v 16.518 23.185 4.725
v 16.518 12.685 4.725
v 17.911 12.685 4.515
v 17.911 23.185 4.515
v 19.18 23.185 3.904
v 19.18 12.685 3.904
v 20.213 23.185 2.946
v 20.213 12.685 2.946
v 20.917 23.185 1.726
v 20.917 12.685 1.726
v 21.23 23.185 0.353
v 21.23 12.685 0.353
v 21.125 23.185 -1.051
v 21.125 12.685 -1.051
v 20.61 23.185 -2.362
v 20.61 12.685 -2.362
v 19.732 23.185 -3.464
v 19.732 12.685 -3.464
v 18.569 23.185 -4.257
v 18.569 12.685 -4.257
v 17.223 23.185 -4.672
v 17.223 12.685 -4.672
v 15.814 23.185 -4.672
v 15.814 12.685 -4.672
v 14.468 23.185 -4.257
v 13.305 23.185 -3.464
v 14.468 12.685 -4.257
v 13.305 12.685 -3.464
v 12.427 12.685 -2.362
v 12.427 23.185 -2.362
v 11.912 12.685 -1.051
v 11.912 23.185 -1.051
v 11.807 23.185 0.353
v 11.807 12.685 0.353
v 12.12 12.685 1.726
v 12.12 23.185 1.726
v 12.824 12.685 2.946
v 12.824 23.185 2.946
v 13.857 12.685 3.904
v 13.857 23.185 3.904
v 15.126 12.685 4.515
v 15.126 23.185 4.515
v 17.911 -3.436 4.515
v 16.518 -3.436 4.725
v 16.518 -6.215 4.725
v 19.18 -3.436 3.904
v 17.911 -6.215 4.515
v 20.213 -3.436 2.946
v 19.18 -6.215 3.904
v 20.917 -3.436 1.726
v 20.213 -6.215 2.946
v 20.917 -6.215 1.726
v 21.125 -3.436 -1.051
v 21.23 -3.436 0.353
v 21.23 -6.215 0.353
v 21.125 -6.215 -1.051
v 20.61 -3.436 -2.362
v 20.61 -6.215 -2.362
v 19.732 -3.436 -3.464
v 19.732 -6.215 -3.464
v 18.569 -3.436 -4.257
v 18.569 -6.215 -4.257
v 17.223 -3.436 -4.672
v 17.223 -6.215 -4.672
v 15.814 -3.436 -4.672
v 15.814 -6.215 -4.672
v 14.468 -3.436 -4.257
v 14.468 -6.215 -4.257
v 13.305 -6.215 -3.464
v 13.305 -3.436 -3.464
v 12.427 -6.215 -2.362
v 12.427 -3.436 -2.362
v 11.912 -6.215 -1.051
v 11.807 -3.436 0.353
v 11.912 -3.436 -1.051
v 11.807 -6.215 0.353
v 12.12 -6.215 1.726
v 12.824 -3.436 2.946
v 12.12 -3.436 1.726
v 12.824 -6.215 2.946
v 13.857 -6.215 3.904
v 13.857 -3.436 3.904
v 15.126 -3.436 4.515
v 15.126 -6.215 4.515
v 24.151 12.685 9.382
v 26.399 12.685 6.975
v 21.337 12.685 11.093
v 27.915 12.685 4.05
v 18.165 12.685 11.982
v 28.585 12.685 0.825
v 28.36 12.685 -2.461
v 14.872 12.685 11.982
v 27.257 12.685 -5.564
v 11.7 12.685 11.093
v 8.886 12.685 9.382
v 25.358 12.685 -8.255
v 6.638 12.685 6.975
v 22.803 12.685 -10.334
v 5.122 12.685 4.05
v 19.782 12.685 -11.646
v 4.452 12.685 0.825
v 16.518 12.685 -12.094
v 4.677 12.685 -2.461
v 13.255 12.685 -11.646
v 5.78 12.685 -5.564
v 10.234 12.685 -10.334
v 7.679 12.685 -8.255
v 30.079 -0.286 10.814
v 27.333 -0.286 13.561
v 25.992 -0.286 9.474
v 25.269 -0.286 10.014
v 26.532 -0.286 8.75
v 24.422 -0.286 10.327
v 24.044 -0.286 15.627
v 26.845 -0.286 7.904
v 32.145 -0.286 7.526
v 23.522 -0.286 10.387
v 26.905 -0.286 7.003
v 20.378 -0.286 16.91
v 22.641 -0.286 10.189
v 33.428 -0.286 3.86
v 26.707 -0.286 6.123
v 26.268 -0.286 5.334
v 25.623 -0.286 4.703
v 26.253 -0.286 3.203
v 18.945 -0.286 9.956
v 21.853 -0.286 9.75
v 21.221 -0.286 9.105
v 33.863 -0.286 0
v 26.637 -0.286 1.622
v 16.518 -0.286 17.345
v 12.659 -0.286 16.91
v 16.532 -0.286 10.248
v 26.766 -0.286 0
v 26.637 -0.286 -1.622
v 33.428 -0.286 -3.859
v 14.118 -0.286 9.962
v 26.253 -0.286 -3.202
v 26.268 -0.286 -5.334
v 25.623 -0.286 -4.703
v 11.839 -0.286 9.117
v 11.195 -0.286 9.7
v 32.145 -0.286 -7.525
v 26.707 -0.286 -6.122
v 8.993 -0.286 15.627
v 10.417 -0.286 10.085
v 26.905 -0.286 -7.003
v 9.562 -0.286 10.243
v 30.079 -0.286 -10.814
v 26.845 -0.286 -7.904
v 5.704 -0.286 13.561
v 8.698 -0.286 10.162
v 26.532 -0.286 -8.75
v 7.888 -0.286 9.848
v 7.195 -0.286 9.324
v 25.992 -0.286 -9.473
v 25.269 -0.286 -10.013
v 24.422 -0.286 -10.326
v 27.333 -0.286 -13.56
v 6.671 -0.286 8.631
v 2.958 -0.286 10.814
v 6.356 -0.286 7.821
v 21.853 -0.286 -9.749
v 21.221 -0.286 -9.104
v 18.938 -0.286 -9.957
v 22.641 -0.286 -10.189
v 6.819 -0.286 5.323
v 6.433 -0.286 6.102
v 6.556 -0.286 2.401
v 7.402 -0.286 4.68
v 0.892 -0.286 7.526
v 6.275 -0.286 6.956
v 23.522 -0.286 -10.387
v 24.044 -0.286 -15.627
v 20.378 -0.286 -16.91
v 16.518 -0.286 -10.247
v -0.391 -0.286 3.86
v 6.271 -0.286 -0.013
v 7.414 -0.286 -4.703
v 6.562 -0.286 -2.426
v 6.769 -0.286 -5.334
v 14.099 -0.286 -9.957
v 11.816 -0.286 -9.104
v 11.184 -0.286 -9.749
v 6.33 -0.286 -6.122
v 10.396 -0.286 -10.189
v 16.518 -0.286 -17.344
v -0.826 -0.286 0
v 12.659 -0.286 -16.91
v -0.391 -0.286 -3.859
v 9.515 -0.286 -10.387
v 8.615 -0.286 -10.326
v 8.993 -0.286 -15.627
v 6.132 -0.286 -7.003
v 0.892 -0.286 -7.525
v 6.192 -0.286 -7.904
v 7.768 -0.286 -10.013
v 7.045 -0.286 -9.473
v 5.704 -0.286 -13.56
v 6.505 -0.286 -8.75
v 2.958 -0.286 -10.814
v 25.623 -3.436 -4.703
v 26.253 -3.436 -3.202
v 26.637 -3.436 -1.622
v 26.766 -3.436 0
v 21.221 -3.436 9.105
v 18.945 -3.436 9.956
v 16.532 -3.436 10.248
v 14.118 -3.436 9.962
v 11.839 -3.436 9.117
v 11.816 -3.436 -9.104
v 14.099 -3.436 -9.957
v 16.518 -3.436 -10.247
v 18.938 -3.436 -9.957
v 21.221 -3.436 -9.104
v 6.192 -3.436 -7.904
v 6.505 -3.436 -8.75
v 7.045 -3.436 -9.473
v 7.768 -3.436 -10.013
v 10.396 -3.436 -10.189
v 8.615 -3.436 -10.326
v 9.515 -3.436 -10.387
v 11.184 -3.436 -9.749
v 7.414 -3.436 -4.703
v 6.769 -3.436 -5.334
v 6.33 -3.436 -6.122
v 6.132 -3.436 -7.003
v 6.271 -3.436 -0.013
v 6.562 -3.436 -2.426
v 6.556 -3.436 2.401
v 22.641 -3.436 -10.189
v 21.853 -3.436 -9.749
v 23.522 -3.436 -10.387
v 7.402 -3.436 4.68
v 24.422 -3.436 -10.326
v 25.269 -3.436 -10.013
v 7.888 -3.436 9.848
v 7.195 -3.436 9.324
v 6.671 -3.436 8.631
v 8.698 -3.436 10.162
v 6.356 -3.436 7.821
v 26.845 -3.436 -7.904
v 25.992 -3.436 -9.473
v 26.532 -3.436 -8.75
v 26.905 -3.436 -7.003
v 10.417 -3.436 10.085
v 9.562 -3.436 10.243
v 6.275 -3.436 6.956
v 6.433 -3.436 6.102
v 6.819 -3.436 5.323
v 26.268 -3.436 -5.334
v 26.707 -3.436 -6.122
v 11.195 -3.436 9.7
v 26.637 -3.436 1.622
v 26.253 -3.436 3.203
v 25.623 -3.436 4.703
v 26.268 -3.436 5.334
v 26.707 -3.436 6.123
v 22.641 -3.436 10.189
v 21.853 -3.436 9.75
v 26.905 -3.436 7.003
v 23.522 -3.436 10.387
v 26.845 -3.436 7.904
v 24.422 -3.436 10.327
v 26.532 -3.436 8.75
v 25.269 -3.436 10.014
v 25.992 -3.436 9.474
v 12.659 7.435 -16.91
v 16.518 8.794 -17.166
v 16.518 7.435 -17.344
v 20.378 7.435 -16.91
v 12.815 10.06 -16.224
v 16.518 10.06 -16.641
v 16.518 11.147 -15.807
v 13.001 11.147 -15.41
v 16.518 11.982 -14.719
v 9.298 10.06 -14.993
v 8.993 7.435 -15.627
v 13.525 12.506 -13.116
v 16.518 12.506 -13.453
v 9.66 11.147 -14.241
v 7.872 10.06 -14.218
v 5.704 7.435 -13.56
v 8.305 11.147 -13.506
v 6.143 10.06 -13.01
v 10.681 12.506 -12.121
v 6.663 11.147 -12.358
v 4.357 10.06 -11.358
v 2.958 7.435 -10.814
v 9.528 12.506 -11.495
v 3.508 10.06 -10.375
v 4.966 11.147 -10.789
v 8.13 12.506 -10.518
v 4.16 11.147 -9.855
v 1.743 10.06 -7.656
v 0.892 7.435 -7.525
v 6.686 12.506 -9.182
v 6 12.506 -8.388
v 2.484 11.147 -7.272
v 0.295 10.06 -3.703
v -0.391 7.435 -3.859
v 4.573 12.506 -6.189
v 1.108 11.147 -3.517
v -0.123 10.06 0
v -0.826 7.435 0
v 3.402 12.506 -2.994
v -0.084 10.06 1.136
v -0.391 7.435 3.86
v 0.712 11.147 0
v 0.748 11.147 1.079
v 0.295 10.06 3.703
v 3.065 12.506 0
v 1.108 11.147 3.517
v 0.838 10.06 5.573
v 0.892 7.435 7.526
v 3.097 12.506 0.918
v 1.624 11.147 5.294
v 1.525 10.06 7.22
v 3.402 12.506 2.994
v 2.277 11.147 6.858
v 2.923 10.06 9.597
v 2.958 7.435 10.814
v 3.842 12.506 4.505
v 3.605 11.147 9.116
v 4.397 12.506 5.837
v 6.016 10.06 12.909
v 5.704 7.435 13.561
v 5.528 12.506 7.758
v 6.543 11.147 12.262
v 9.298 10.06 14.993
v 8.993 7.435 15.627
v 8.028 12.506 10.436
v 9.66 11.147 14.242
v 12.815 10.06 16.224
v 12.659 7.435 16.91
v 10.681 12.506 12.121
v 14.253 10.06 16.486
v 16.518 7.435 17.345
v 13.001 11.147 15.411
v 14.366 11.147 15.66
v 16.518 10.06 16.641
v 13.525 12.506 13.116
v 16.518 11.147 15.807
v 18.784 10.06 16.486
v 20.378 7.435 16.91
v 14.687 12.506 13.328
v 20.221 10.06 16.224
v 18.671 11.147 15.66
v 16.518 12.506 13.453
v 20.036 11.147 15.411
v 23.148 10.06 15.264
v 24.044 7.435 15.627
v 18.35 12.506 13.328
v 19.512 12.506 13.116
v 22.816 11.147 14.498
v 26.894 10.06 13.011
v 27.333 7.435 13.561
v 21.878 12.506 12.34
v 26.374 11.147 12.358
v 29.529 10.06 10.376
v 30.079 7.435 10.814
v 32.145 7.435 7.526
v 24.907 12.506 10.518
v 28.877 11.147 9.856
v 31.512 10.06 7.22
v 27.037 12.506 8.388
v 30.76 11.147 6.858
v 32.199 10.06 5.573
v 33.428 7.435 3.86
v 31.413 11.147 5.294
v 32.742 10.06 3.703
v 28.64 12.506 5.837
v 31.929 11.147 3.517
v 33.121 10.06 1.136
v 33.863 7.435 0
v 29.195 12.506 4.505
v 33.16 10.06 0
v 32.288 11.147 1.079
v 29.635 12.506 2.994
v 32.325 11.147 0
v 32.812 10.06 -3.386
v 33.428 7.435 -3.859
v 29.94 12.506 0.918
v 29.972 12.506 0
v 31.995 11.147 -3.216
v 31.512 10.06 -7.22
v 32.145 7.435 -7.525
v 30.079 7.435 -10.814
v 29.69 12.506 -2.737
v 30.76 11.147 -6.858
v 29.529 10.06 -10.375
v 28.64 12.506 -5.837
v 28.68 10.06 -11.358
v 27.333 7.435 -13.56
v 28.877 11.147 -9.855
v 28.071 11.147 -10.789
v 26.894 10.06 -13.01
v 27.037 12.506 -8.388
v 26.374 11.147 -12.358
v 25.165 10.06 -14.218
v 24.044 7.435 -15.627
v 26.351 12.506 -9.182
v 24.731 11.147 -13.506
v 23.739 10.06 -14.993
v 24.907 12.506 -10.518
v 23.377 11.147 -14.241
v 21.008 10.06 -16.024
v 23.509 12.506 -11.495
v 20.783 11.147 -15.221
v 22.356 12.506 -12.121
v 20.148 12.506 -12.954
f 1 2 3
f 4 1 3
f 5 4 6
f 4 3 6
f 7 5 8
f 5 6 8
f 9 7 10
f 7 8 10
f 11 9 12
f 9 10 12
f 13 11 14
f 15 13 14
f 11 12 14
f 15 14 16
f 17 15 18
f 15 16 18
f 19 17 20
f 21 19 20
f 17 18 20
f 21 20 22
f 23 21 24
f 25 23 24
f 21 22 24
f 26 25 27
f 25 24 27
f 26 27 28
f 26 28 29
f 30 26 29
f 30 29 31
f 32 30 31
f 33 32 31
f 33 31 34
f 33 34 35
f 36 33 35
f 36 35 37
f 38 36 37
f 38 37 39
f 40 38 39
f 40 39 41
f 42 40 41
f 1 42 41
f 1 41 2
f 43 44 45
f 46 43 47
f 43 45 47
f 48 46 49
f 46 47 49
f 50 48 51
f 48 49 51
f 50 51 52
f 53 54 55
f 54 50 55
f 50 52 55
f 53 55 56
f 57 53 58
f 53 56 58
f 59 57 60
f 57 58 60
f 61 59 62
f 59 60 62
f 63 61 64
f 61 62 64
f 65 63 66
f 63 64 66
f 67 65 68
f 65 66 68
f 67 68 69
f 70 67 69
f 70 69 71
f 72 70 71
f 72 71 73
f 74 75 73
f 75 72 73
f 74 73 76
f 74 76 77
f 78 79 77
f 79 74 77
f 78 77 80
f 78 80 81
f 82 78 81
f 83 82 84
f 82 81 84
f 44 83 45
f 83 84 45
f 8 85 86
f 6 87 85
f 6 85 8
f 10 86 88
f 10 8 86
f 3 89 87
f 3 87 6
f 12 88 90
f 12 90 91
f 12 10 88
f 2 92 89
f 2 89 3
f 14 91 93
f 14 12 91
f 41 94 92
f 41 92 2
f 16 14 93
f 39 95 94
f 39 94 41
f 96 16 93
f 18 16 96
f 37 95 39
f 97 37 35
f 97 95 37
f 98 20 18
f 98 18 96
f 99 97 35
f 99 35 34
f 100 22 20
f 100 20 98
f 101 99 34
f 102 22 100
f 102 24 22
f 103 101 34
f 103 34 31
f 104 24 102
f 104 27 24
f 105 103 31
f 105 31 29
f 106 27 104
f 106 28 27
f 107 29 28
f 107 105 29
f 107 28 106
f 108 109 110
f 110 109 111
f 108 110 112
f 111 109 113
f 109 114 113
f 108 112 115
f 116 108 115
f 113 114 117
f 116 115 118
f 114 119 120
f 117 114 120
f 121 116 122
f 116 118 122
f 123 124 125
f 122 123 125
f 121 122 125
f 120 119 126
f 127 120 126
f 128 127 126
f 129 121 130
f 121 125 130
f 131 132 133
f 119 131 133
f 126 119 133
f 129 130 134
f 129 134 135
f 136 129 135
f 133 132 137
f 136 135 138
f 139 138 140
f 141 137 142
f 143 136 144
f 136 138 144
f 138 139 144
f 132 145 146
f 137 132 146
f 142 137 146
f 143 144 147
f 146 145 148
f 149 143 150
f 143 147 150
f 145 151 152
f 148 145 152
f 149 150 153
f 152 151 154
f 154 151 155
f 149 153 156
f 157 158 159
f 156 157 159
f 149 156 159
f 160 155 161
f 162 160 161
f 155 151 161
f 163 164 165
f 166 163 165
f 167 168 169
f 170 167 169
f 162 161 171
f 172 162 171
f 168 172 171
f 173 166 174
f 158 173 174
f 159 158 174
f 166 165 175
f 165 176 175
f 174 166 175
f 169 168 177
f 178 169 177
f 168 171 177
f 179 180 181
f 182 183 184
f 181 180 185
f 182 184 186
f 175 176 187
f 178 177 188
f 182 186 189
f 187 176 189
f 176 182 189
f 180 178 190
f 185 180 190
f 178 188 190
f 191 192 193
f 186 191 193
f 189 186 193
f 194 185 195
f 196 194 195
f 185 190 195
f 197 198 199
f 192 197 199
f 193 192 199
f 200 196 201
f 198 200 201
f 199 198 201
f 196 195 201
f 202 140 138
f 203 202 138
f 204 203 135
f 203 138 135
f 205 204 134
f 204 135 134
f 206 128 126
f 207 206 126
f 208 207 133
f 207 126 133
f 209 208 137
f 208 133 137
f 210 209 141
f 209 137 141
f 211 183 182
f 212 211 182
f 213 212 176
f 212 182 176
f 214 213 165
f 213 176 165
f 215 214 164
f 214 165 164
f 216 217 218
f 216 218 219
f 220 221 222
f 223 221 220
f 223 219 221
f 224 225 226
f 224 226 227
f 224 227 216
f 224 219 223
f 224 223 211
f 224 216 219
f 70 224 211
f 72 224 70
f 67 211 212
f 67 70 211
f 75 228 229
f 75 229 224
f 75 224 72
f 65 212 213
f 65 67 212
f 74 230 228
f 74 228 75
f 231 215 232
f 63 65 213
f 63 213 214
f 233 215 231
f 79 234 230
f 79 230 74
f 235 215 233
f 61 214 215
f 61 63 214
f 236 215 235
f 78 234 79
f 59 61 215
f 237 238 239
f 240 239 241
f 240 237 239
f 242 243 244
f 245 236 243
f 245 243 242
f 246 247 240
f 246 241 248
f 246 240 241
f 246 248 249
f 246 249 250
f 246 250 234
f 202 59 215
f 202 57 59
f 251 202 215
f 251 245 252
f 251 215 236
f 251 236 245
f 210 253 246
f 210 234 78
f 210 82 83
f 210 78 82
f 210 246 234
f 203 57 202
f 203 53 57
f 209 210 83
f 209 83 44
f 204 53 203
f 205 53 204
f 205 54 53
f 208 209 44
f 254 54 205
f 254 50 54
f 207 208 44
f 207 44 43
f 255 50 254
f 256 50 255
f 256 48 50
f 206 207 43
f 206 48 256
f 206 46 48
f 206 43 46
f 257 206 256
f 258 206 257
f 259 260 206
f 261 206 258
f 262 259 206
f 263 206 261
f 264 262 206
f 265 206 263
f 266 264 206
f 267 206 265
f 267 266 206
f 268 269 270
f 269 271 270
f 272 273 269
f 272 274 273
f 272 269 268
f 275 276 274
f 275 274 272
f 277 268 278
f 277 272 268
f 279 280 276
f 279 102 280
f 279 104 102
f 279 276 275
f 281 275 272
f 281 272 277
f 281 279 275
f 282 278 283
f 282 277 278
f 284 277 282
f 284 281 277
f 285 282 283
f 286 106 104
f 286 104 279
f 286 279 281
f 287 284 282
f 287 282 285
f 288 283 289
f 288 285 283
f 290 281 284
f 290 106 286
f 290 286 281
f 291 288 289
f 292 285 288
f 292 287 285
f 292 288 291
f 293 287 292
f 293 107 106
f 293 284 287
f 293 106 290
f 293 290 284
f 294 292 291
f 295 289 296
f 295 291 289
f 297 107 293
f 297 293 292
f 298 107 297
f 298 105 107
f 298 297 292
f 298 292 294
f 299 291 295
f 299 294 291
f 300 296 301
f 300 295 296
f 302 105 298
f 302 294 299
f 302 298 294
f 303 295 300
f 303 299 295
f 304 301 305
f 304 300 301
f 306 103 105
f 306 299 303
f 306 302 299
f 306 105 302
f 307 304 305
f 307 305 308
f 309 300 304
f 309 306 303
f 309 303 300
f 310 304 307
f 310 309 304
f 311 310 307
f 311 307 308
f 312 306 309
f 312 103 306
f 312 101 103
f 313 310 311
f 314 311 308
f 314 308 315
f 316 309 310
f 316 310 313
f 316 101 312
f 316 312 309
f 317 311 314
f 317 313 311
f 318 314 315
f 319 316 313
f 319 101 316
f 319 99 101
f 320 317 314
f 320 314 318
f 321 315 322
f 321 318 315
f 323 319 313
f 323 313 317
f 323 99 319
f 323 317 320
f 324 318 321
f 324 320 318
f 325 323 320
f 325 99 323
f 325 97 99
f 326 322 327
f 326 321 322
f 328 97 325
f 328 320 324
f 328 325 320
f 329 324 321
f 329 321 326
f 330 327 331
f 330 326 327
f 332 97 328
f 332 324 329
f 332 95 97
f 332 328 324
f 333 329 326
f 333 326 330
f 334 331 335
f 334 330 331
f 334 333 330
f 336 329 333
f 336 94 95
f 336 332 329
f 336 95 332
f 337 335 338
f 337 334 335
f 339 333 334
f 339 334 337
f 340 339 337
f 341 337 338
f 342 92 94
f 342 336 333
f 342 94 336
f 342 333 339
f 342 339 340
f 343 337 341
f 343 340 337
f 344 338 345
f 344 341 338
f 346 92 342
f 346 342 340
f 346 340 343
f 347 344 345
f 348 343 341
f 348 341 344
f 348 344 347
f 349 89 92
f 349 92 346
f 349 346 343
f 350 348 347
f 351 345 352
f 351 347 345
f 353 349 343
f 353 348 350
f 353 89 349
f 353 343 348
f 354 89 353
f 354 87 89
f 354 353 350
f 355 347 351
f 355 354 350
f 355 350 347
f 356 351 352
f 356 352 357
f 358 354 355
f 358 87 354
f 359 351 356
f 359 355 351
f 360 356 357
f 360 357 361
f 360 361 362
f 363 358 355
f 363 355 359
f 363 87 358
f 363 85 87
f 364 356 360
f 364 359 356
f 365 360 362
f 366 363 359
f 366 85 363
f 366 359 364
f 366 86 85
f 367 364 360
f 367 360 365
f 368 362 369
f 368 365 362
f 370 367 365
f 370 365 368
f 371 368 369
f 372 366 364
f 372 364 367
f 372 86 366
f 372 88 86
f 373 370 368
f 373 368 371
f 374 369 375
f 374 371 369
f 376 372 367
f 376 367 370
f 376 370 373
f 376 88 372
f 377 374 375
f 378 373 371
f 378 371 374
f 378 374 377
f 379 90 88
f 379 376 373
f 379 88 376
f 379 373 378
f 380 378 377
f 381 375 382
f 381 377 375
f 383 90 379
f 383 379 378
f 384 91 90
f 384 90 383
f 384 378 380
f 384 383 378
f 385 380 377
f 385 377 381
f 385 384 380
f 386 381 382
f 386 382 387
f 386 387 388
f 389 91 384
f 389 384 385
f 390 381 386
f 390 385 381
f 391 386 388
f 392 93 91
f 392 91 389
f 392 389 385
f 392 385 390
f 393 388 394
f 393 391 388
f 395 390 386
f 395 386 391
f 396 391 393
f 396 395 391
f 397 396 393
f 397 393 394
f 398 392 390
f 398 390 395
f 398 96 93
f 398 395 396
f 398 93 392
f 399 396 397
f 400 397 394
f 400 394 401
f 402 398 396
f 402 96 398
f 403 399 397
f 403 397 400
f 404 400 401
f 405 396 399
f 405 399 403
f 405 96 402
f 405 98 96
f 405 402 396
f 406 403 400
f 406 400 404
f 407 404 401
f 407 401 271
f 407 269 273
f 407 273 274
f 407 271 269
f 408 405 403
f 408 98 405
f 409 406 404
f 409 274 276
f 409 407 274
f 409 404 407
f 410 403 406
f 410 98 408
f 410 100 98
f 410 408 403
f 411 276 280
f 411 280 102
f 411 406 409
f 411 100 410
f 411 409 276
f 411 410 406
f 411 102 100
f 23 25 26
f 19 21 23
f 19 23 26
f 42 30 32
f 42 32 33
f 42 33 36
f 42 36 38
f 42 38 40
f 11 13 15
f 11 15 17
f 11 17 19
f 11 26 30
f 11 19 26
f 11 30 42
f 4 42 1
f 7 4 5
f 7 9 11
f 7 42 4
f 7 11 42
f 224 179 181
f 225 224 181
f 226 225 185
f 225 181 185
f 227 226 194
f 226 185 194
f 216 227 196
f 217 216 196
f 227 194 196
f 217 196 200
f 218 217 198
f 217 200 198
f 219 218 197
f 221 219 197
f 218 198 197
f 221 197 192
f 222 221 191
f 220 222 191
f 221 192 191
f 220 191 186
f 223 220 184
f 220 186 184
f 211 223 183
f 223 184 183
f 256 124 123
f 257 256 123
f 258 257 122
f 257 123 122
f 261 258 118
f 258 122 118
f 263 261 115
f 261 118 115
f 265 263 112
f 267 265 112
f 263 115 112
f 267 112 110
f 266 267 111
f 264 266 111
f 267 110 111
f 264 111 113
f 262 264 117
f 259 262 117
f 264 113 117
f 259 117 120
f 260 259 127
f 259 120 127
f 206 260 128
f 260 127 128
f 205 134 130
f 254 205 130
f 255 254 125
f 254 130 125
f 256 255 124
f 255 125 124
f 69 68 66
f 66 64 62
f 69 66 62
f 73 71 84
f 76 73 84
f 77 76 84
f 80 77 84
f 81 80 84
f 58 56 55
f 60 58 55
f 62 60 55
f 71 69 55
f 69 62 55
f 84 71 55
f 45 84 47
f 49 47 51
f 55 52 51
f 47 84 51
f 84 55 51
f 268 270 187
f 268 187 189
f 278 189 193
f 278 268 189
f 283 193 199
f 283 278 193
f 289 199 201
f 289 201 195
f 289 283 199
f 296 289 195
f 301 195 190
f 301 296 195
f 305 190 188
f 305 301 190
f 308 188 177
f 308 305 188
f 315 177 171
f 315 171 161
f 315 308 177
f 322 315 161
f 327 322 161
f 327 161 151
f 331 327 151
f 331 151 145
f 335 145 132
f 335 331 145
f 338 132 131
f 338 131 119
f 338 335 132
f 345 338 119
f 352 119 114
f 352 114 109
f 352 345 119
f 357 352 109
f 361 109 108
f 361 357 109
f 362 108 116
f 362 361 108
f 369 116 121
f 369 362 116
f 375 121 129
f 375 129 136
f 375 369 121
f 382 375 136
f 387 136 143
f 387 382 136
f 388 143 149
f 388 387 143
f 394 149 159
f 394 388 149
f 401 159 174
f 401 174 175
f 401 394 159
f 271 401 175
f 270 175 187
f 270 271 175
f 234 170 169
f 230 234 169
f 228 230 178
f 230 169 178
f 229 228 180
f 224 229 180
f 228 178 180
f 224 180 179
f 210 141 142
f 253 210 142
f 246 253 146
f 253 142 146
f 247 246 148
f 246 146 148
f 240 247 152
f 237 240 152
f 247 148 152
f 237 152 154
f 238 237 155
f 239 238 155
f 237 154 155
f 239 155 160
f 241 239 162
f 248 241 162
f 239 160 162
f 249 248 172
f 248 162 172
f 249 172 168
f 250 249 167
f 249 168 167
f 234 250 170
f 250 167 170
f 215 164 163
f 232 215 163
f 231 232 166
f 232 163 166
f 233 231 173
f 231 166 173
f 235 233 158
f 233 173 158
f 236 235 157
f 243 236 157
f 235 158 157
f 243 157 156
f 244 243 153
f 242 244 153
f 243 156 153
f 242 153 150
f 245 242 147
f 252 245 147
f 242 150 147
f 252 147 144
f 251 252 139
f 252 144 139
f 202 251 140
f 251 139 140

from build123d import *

# Parameters (mm, degrees)
SKETCH1_W                = 16.518614554
SKETCH1_H                = 12.353050884
BOSS_EXTRUDE1_DEPTH      = 10
BOSS_EXTRUDE1_DEPTH_BACK = 18
SKETCH3_R                = 4.5
FILLET1_R                = 5
SKETCH4_R                = 9.759449404
SKETCH4_R_2              = 3
BOSS_EXTRUDE2_DEPTH      = 3
SCALE2_SCALE             = 1.5
SCALE3_SCALE             = 0.7


with BuildPart() as part:
    # Sketch1 → Revolve1 (revolve)
    with BuildSketch(Plane.XY, mode=Mode.PRIVATE) as revolve1_sk:
        with Locations((8.259307277, 6.176525442)):
            Rectangle(SKETCH1_W, SKETCH1_H)
    revolve(revolve1_sk.sketch.rotate(Axis((16.518614554, 0, 0), (0, 1, 0)), 270), axis=Axis((16.518614554, 0, 0), (0, 1, 0)))

    # Sketch3 → Boss-Extrude1 (add, two sides: drawn at the far end of the back side and taken through both)
    with BuildSketch(Plane(origin=(0, 12.353050884, 0), x_dir=(1, 0, 0), z_dir=(0, 1, 0)).offset(-BOSS_EXTRUDE1_DEPTH_BACK)):
        with Locations(Location((16.518614554, 0, 0), (0, 0, 270))):
            Circle(SKETCH3_R)
    extrude(amount=BOSS_EXTRUDE1_DEPTH + BOSS_EXTRUDE1_DEPTH_BACK)

    # Fillet1
    fillet1_edges = [part.edges().sort_by_distance(p)[0] for p in [
        (16.518614554, 12.353050884, 16.518614554),
    ]]
    fillet(fillet1_edges, radius=FILLET1_R)

    # Sketch4 → Boss-Extrude2 (add)
    with BuildSketch(Plane.XZ):
        with BuildLine():
            Line((11.738962044, -4.77965251), (16.518614554, 0))
            Line((16.518614554, 0), (11.881429434, 4.637185121))
            ThreePointArc((11.881429434, 4.637185121), (9.893846238, 3.761487884), (7.836164974, 4.456671622))
            ThreePointArc((7.836164974, 4.456671622), (6.759173098, -0.012454385), (7.847567883, -4.478817062))
            ThreePointArc((7.847567883, -4.478817062), (9.848875397, -3.909897633), (11.738962044, -4.77965251))
        make_face()
        with BuildLine():
            Line((21.298267065, 4.77965251), (16.518614554, 0))
            Line((16.518614554, 0), (21.298267065, -4.77965251))
            ThreePointArc((21.298267065, -4.77965251), (23.188353712, -3.909897633), (25.189661226, -4.478817062))
            ThreePointArc((25.189661226, -4.478817062), (26.002060498, -2.304583627), (26.278063958, 0))
            ThreePointArc((26.278063958, 0), (26.002060498, 2.304583627), (25.189661226, 4.478817062))
            ThreePointArc((25.189661226, 4.478817062), (23.188353712, 3.909897633), (21.298267065, 4.77965251))
        make_face()
        with BuildLine():
            Line((11.881429434, 4.637185121), (16.518614554, 0))
            Line((16.518614554, 0), (21.298267065, 4.77965251))
            ThreePointArc((21.298267065, 4.77965251), (20.428512187, 6.669739158), (20.997431617, 8.671046672))
            ThreePointArc((20.997431617, 8.671046672), (16.53106894, 9.759441457), (12.061942933, 8.68244958))
            ThreePointArc((12.061942933, 8.68244958), (12.580171282, 7.781857425), (12.76010909, 6.758505464))
            ThreePointArc((12.76010909, 6.758505464), (12.531747688, 5.610455167), (11.881429434, 4.637185121))
        make_face()
        with BuildLine():
            Line((21.298267065, -4.77965251), (16.518614554, 0))
            Line((16.518614554, 0), (11.738962044, -4.77965251))
            ThreePointArc((11.738962044, -4.77965251), (12.389280298, -5.752922557), (12.6176417, -6.900972854))
            ThreePointArc((12.6176417, -6.900972854), (12.469524182, -7.831975707), (12.039797492, -8.671046672))
            ThreePointArc((12.039797492, -8.671046672), (16.518614554, -9.759449404), (20.997431617, -8.671046672))
            ThreePointArc((20.997431617, -8.671046672), (20.428512187, -6.669739158), (21.298267065, -4.77965251))
        make_face()
        with Locations((16.518614554, 0)):
            Circle(SKETCH4_R)
        with Locations((9.6176417, -6.900972854)):
            Circle(SKETCH4_R_2)
        with BuildLine():
            ThreePointArc((12.6176417, -6.900972854), (12.389280298, -5.752922557), (11.738962044, -4.77965251))
            Line((11.738962044, -4.77965251), (9.6176417, -6.900972854))
            ThreePointArc((9.6176417, -6.900972854), (10.760299266, -7.879635632), (12.039797492, -8.671046672))
            ThreePointArc((12.039797492, -8.671046672), (12.469524182, -7.831975707), (12.6176417, -6.900972854))
        make_face()
        with BuildLine():
            Line((9.6176417, -6.900972854), (11.738962044, -4.77965251))
            ThreePointArc((11.738962044, -4.77965251), (9.848875397, -3.909897633), (7.847567883, -4.478817062))
            ThreePointArc((7.847567883, -4.478817062), (8.638978922, -5.758315289), (9.6176417, -6.900972854))
        make_face()
        with Locations((9.76010909, 6.758505464)):
            Circle(SKETCH4_R_2)
        with BuildLine():
            Line((11.881429434, 4.637185121), (13.336634039, 3.181980515))
            ThreePointArc((13.336634039, 3.181980515), (16.518614554, 4.5), (19.70059507, 3.181980515))
            Line((19.70059507, 3.181980515), (21.298267065, 4.77965251))
            ThreePointArc((21.298267065, 4.77965251), (20.428512187, 6.669739158), (20.997431617, 8.671046672))
            ThreePointArc((20.997431617, 8.671046672), (16.53106894, 9.759441457), (12.061942933, 8.68244958))
            ThreePointArc((12.061942933, 8.68244958), (12.580171282, 7.781857425), (12.76010909, 6.758505464))
            ThreePointArc((12.76010909, 6.758505464), (12.531747688, 5.610455167), (11.881429434, 4.637185121))
        make_face()
        with Locations((23.419587408, 6.900972854)):
            Circle(SKETCH4_R_2)
        with BuildLine():
            Line((23.419587408, 6.900972854), (21.298267065, 4.77965251))
            ThreePointArc((21.298267065, 4.77965251), (23.188353712, 3.909897633), (25.189661226, 4.478817062))
            ThreePointArc((25.189661226, 4.478817062), (24.398250187, 5.758315289), (23.419587408, 6.900972854))
        make_face()
        with BuildLine():
            ThreePointArc((20.997431617, 8.671046672), (20.428512187, 6.669739158), (21.298267065, 4.77965251))
            Line((21.298267065, 4.77965251), (23.419587408, 6.900972854))
            ThreePointArc((23.419587408, 6.900972854), (22.276929843, 7.879635632), (20.997431617, 8.671046672))
        make_face()
        with Locations((23.419587408, -6.900972854)):
            Circle(SKETCH4_R_2)
        with BuildLine():
            Line((23.419587408, -6.900972854), (21.298267065, -4.77965251))
            ThreePointArc((21.298267065, -4.77965251), (20.428512187, -6.669739158), (20.997431617, -8.671046672))
            ThreePointArc((20.997431617, -8.671046672), (22.276929843, -7.879635632), (23.419587408, -6.900972854))
        make_face()
        with BuildLine():
            ThreePointArc((25.189661226, -4.478817062), (23.188353712, -3.909897633), (21.298267065, -4.77965251))
            Line((21.298267065, -4.77965251), (23.419587408, -6.900972854))
            ThreePointArc((23.419587408, -6.900972854), (24.398250187, -5.758315289), (25.189661226, -4.478817062))
        make_face()
    extrude(amount=BOSS_EXTRUDE2_DEPTH)


with BuildPart() as part_1:
    # Scale2: scaled about (16.521177645, 5.714728263, -0.002563091)
    add(part.part.scale(SCALE2_SCALE).moved(Location((-8.260588823, -2.857364131, 0.001281545))))


with BuildPart() as part_2:
    # Scale3: scaled about (16.521177645, 5.714728263, -0.002563091)
    add(part_1.part.scale(SCALE3_SCALE).moved(Location((4.956353294, 1.714418479, -0.000768927))))


solid = part_2.part
